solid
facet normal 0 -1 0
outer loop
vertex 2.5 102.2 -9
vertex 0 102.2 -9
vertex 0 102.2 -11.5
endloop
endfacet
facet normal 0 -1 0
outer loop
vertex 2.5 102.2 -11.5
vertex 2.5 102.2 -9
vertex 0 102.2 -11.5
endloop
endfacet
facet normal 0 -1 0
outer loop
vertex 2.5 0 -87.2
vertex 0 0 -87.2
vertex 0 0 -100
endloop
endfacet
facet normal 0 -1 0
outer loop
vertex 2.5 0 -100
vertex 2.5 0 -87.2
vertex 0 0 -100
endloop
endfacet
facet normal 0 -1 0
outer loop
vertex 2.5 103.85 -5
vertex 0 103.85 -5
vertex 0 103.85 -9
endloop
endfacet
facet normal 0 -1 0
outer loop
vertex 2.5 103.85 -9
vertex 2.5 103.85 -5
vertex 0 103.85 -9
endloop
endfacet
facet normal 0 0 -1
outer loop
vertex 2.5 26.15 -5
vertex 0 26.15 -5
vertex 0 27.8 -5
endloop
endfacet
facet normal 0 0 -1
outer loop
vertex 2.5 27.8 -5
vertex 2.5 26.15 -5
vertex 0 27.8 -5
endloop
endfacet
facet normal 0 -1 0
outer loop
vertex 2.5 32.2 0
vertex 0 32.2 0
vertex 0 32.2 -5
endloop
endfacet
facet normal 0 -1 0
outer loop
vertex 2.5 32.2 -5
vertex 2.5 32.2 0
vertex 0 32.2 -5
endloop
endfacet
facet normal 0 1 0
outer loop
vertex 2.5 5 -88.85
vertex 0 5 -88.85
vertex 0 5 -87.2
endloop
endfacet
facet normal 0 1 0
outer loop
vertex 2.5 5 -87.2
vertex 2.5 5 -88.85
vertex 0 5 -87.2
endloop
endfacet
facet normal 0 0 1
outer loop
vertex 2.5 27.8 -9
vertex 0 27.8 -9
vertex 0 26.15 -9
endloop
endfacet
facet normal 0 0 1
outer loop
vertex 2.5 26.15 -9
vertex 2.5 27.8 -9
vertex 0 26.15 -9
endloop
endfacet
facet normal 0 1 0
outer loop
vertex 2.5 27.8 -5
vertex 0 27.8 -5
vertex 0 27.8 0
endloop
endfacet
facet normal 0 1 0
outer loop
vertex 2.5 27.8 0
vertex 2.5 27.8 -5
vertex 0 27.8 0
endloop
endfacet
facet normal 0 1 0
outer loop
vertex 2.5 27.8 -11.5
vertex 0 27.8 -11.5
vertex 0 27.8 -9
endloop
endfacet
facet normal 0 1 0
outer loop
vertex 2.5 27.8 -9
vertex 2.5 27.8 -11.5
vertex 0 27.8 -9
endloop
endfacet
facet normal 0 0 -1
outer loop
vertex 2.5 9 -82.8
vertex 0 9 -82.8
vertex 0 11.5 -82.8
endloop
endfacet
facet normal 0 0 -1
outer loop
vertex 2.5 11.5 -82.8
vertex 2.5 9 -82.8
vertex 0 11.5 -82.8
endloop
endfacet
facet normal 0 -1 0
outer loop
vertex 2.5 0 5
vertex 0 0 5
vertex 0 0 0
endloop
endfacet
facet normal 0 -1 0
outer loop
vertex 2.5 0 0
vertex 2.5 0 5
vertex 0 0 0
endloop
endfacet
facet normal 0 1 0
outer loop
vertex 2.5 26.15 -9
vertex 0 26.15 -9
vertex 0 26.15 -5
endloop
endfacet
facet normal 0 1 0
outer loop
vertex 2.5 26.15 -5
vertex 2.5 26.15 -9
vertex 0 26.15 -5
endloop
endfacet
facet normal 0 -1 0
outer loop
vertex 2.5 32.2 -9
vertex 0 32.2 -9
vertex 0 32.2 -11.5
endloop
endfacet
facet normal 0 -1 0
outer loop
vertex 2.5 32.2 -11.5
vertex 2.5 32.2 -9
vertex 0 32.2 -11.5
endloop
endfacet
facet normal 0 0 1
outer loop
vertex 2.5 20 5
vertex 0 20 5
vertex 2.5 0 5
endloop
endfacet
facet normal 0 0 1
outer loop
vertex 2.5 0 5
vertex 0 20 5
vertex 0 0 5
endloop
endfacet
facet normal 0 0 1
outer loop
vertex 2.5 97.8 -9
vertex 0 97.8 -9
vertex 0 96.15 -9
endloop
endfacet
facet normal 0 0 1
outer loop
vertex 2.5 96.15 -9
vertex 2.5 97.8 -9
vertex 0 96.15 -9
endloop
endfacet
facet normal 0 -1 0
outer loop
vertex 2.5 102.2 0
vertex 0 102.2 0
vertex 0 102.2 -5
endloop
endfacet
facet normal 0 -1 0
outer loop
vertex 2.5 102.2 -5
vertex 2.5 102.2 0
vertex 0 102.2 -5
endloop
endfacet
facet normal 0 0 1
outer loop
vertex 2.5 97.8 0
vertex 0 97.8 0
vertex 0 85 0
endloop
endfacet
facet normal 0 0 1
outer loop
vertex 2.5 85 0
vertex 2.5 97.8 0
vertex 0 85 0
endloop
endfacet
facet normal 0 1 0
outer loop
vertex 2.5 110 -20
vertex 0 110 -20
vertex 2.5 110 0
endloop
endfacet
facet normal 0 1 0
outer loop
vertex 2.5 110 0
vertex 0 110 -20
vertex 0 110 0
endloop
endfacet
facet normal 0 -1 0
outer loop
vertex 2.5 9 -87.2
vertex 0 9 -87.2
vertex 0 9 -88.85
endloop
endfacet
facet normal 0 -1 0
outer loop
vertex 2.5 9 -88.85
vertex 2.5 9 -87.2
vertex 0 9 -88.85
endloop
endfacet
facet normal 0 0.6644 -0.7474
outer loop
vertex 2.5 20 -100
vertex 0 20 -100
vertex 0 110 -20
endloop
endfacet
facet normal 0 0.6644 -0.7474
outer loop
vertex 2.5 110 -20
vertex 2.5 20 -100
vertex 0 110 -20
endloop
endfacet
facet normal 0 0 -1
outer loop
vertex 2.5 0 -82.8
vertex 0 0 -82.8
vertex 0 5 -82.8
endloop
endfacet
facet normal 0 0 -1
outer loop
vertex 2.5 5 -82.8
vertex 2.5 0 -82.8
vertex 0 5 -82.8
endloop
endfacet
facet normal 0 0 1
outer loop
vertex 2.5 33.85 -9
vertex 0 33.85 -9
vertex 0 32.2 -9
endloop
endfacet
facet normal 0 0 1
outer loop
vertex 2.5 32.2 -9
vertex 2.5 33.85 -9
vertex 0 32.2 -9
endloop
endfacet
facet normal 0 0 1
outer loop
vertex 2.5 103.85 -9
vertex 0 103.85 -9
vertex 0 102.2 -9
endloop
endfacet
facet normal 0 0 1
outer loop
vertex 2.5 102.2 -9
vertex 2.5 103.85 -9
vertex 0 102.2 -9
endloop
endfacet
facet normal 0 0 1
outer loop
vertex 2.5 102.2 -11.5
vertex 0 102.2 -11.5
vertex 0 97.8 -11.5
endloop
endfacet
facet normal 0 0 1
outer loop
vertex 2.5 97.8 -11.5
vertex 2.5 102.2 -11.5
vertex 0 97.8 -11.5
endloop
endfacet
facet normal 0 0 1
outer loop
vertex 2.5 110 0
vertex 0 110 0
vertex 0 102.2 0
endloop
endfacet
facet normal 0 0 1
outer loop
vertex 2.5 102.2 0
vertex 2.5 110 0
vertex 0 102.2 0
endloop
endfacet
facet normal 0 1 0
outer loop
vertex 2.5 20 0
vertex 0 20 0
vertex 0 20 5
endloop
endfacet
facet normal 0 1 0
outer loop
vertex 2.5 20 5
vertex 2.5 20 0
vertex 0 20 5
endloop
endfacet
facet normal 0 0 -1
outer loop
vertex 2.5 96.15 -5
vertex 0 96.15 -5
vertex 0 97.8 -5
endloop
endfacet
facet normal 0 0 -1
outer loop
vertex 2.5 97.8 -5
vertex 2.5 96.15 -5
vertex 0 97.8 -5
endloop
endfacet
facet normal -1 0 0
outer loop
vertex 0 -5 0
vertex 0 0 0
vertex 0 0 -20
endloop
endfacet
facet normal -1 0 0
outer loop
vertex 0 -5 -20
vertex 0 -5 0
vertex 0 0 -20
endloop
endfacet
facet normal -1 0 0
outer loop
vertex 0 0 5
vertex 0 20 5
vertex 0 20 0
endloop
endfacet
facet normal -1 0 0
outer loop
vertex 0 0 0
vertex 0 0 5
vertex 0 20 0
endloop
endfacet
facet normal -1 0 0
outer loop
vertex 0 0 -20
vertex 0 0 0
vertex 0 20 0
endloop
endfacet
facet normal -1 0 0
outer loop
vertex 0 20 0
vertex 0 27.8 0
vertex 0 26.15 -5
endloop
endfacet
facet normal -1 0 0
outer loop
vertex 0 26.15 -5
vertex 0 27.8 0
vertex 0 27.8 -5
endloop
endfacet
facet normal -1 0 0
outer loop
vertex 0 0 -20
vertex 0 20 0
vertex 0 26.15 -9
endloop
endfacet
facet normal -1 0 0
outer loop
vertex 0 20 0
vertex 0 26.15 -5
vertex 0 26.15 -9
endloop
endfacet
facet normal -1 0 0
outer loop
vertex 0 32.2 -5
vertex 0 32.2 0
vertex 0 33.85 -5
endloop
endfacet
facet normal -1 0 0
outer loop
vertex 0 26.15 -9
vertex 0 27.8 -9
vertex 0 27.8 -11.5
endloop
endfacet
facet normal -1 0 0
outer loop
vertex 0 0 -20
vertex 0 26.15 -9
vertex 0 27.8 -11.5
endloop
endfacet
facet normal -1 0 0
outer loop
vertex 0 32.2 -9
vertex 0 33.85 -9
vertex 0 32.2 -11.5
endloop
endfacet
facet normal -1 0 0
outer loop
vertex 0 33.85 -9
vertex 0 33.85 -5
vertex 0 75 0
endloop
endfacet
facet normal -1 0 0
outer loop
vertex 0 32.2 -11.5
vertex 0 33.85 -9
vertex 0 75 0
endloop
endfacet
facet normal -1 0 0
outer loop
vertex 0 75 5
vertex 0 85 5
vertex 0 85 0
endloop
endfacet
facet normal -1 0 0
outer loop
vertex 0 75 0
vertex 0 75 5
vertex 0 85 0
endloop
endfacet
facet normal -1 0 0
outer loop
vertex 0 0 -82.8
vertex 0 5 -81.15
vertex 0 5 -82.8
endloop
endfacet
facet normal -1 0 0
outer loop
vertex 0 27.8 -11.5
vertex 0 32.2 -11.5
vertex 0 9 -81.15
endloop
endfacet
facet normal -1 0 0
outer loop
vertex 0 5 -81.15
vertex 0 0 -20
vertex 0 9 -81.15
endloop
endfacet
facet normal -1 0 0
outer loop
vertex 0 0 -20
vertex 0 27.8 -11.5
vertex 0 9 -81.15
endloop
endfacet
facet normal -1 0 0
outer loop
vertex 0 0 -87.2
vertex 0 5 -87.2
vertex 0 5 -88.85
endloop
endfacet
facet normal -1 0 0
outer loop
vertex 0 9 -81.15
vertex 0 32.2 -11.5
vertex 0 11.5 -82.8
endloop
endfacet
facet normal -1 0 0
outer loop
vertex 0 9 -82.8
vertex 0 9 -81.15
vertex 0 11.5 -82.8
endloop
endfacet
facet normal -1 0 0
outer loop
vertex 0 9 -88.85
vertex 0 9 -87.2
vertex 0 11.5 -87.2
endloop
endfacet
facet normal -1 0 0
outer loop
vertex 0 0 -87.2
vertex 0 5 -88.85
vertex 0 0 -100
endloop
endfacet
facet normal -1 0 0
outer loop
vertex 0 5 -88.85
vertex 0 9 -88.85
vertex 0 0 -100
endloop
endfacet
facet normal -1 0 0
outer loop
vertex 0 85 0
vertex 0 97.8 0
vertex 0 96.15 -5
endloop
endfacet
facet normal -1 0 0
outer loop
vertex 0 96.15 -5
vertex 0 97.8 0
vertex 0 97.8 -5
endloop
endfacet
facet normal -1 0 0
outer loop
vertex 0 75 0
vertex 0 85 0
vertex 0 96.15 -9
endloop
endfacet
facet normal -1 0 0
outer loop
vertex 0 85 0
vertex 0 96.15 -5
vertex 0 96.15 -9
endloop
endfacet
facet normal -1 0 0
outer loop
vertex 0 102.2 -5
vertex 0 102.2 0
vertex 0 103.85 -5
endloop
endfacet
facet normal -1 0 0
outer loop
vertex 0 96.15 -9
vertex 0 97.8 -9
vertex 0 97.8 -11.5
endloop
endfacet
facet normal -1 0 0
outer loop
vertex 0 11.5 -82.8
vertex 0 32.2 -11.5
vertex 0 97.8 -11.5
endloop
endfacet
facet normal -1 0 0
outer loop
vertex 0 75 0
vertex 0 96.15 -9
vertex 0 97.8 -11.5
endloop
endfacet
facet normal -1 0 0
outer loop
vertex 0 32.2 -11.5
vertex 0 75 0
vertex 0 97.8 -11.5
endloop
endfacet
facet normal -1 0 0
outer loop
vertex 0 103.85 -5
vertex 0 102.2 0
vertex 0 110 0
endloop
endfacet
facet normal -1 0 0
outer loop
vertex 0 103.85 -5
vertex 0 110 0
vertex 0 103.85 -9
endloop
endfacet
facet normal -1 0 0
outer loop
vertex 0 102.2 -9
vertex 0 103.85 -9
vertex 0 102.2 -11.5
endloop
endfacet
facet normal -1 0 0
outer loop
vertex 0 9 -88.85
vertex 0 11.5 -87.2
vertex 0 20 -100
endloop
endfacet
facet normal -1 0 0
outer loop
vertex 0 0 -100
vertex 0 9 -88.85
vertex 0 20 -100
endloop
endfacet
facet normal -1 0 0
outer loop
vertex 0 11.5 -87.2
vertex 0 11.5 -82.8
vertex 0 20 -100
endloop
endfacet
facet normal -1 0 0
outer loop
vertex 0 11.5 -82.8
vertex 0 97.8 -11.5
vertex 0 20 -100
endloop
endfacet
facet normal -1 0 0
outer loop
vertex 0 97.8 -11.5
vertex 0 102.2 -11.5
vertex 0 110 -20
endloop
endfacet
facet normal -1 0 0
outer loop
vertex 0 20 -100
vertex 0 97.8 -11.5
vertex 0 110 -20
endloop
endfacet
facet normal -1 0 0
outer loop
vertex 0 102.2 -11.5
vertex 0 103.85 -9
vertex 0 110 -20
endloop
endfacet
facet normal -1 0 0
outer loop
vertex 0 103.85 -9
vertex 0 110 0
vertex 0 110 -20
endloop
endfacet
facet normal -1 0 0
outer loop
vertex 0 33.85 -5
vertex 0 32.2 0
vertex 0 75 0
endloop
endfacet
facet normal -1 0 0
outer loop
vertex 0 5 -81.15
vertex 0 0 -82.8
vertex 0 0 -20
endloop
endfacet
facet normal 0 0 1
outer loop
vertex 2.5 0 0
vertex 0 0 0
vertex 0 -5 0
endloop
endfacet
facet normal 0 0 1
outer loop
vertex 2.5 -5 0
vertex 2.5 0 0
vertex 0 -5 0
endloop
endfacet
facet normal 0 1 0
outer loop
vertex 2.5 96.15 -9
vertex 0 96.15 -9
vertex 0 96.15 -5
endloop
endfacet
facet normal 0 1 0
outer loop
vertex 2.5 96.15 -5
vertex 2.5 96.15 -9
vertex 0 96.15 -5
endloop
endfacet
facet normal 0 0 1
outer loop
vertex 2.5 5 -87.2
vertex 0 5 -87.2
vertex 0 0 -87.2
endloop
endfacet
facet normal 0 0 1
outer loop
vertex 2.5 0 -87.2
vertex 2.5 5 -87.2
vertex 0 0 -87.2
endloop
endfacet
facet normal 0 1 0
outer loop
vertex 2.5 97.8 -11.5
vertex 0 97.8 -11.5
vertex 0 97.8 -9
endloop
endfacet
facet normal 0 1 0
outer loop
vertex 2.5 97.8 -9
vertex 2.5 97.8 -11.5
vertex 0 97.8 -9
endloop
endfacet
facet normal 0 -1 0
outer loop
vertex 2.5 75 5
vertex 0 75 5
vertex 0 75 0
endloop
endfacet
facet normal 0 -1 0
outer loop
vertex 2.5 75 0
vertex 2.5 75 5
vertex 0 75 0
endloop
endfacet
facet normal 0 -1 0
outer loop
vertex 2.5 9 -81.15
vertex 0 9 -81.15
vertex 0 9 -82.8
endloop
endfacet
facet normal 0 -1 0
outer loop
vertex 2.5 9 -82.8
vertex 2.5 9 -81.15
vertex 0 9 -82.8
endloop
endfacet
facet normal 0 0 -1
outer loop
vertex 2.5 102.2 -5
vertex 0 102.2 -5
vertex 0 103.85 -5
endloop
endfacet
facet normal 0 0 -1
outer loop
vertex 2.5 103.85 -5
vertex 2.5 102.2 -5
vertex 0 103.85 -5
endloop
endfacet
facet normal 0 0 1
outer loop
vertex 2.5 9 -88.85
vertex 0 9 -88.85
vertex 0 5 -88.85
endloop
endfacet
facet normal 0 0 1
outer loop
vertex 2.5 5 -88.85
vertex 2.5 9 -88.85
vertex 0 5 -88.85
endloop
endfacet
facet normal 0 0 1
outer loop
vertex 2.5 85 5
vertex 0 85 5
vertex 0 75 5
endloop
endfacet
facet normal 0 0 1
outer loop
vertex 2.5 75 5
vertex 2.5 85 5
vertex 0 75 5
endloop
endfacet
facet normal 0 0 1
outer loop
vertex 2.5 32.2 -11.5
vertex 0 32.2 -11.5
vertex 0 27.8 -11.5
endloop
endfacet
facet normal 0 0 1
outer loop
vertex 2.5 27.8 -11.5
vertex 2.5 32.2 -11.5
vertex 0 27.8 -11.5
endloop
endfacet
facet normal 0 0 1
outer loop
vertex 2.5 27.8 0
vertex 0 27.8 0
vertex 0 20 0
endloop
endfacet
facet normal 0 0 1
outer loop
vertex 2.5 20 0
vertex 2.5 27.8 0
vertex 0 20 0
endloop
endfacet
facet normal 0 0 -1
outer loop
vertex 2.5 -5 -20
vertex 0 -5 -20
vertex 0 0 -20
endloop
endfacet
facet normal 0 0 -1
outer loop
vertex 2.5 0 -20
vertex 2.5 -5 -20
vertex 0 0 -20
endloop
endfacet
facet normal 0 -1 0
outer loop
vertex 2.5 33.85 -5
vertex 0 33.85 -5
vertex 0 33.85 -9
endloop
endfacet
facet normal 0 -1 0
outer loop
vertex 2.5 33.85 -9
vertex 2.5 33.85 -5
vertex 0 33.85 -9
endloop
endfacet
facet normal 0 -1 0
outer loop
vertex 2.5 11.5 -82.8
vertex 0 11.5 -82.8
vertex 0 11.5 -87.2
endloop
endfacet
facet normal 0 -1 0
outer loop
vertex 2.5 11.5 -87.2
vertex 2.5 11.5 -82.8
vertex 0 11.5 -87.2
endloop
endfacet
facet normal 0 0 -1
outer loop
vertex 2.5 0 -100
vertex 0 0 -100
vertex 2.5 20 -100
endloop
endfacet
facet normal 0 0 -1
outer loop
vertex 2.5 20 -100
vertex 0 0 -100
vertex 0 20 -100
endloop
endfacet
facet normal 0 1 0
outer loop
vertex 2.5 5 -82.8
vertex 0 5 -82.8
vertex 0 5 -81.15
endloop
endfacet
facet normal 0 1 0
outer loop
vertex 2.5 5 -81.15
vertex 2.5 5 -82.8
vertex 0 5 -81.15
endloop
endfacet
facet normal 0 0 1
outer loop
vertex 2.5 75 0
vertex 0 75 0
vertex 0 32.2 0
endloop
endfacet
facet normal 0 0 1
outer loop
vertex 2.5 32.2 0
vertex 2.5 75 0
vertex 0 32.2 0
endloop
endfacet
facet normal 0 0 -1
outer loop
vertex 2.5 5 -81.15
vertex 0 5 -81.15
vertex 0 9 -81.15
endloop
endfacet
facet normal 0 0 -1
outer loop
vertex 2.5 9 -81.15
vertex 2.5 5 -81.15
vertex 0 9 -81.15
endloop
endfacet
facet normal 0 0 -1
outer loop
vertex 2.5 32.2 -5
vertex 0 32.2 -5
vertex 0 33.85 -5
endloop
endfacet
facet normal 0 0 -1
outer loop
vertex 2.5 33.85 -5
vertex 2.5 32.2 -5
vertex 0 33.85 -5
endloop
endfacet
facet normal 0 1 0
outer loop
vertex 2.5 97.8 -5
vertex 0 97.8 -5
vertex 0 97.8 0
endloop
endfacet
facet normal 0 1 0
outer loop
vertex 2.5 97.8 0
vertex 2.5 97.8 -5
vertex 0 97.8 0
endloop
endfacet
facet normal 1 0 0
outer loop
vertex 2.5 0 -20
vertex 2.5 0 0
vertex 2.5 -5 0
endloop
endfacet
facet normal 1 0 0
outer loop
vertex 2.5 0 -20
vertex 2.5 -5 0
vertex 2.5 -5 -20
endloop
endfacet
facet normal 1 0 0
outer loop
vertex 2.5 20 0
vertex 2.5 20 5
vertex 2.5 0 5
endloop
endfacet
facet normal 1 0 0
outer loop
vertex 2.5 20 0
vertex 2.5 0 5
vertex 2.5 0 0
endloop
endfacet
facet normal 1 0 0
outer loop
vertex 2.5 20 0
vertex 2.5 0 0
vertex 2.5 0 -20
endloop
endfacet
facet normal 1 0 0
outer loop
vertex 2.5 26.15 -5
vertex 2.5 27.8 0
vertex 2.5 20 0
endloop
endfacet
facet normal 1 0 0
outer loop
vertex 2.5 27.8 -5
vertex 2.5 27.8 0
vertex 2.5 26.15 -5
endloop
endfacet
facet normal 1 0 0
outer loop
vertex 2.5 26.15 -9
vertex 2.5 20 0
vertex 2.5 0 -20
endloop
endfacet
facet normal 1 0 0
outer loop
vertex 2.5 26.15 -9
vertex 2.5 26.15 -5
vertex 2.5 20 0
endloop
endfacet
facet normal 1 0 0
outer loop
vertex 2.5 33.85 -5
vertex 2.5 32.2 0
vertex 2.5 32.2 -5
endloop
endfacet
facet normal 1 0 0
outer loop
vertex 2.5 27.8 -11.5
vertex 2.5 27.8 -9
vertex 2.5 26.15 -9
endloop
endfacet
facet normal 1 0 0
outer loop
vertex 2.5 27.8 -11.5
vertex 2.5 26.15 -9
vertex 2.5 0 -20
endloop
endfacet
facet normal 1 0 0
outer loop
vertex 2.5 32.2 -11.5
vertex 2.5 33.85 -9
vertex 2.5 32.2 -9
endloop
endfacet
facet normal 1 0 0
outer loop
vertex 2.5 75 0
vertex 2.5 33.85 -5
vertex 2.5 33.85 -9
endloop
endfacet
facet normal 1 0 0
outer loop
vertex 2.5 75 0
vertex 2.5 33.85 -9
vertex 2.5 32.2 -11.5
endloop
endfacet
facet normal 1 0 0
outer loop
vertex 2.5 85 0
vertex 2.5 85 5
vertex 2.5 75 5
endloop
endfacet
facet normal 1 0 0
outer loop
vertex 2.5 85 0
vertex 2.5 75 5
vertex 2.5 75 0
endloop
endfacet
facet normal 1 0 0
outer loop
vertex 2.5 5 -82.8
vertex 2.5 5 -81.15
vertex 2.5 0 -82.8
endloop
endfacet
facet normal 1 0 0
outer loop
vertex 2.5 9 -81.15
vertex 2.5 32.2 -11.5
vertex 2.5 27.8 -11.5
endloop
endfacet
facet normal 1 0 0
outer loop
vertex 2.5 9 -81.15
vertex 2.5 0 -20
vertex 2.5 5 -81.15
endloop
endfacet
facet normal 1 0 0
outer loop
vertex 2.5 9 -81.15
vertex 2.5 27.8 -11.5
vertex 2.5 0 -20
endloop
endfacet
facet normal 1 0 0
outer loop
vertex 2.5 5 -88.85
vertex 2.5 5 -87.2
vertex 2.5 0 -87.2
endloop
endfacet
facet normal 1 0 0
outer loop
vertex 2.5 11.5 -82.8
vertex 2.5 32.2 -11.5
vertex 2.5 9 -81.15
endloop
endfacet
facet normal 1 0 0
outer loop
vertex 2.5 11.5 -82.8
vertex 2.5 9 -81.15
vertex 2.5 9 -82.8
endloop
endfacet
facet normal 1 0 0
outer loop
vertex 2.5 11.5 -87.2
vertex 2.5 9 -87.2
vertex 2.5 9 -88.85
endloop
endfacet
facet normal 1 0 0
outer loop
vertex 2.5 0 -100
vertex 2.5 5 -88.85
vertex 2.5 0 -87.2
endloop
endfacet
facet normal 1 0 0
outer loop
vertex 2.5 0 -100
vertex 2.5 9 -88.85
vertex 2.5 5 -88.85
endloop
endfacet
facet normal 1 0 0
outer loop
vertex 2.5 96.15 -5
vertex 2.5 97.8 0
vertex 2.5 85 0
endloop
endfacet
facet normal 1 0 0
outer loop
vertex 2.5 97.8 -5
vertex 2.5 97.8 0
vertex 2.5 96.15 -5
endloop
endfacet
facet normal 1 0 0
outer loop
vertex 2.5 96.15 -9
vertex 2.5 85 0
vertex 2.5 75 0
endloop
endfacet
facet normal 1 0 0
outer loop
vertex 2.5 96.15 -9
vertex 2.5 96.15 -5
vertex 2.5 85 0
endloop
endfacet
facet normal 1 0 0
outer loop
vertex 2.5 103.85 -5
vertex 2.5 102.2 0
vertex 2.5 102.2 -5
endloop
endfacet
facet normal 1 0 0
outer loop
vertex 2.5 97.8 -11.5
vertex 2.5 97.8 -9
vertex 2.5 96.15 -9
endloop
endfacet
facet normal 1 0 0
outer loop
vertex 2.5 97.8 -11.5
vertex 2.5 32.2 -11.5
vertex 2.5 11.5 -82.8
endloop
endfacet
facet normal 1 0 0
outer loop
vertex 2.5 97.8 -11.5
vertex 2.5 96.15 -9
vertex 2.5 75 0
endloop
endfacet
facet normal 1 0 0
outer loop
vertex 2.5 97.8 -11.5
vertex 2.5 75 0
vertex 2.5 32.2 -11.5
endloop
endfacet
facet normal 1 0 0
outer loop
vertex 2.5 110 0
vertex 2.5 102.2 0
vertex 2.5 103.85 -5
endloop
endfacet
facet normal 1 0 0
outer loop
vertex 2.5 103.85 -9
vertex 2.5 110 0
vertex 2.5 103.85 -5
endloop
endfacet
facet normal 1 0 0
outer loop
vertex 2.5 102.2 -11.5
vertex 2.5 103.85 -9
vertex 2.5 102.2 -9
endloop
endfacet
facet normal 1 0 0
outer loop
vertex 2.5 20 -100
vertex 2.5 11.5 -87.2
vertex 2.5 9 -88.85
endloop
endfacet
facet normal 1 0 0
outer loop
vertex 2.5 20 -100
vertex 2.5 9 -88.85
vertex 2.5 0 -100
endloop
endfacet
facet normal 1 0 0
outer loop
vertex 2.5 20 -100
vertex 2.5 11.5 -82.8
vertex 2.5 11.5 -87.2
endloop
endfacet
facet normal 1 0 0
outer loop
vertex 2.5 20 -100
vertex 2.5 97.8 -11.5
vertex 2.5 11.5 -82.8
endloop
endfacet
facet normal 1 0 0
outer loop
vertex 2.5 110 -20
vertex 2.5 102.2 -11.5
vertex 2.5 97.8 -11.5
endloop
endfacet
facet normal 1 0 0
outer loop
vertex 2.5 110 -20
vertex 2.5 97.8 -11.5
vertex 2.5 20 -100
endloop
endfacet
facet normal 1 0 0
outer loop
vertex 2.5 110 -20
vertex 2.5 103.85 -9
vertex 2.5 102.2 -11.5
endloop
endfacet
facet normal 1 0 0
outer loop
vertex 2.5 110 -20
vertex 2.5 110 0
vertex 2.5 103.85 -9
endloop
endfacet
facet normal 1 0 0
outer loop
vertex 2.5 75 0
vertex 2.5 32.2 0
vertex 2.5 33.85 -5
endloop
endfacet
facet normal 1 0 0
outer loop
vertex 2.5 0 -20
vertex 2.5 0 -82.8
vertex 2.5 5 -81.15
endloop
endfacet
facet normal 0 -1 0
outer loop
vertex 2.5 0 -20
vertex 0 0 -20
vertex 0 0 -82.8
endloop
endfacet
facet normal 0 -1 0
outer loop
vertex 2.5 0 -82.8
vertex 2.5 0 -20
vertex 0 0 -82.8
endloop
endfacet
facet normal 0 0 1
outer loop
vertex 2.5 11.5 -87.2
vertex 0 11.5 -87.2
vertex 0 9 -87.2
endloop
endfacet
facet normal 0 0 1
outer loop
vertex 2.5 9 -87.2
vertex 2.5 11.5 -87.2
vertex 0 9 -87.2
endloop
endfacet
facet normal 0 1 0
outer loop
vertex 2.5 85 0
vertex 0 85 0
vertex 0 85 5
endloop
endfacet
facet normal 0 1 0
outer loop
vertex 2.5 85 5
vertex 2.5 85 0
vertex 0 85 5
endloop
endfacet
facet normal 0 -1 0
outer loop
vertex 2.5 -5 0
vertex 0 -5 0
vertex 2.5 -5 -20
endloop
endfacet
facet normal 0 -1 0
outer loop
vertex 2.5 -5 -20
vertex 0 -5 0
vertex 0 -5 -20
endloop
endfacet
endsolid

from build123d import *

# Parameters (mm, degrees)
BOSS_EXTRUDE1_DEPTH = 2.5


with BuildPart() as part:
    # Sketch1 → Boss-Extrude1 (new body)
    with BuildSketch(Plane(origin=(0, 0, 0), x_dir=(0, 0, -1), z_dir=(1, 0, 0))):
        Polygon((100, 20), (20, 110), (0, 110), (0, 102.2), (5, 102.2), (5, 103.85), (9, 103.85), (9, 102.2), (11.5, 102.2), (11.5, 97.8), (9, 97.8), (9, 96.15), (5, 96.15), (5, 97.8), (0, 97.8), (0, 85), (-5, 85), (-5, 75), (0, 75), (0, 32.2), (5, 32.2), (5, 33.85), (9, 33.85), (9, 32.2), (11.5, 32.2), (11.5, 27.8), (9, 27.8), (9, 26.15), (5, 26.15), (5, 27.8), (0, 27.8), (0, 20), (-5, 20), (-5, 0), (0, 0), (0, -5), (20, -5), (20, 0), (82.8, 0), (82.8, 5), (81.15, 5), (81.15, 9), (82.8, 9), (82.8, 11.5), (87.2, 11.5), (87.2, 9), (88.85, 9), (88.85, 5), (87.2, 5), (87.2, 0), (100, 0), align=None)
    extrude(amount=BOSS_EXTRUDE1_DEPTH)


solid = part.part
